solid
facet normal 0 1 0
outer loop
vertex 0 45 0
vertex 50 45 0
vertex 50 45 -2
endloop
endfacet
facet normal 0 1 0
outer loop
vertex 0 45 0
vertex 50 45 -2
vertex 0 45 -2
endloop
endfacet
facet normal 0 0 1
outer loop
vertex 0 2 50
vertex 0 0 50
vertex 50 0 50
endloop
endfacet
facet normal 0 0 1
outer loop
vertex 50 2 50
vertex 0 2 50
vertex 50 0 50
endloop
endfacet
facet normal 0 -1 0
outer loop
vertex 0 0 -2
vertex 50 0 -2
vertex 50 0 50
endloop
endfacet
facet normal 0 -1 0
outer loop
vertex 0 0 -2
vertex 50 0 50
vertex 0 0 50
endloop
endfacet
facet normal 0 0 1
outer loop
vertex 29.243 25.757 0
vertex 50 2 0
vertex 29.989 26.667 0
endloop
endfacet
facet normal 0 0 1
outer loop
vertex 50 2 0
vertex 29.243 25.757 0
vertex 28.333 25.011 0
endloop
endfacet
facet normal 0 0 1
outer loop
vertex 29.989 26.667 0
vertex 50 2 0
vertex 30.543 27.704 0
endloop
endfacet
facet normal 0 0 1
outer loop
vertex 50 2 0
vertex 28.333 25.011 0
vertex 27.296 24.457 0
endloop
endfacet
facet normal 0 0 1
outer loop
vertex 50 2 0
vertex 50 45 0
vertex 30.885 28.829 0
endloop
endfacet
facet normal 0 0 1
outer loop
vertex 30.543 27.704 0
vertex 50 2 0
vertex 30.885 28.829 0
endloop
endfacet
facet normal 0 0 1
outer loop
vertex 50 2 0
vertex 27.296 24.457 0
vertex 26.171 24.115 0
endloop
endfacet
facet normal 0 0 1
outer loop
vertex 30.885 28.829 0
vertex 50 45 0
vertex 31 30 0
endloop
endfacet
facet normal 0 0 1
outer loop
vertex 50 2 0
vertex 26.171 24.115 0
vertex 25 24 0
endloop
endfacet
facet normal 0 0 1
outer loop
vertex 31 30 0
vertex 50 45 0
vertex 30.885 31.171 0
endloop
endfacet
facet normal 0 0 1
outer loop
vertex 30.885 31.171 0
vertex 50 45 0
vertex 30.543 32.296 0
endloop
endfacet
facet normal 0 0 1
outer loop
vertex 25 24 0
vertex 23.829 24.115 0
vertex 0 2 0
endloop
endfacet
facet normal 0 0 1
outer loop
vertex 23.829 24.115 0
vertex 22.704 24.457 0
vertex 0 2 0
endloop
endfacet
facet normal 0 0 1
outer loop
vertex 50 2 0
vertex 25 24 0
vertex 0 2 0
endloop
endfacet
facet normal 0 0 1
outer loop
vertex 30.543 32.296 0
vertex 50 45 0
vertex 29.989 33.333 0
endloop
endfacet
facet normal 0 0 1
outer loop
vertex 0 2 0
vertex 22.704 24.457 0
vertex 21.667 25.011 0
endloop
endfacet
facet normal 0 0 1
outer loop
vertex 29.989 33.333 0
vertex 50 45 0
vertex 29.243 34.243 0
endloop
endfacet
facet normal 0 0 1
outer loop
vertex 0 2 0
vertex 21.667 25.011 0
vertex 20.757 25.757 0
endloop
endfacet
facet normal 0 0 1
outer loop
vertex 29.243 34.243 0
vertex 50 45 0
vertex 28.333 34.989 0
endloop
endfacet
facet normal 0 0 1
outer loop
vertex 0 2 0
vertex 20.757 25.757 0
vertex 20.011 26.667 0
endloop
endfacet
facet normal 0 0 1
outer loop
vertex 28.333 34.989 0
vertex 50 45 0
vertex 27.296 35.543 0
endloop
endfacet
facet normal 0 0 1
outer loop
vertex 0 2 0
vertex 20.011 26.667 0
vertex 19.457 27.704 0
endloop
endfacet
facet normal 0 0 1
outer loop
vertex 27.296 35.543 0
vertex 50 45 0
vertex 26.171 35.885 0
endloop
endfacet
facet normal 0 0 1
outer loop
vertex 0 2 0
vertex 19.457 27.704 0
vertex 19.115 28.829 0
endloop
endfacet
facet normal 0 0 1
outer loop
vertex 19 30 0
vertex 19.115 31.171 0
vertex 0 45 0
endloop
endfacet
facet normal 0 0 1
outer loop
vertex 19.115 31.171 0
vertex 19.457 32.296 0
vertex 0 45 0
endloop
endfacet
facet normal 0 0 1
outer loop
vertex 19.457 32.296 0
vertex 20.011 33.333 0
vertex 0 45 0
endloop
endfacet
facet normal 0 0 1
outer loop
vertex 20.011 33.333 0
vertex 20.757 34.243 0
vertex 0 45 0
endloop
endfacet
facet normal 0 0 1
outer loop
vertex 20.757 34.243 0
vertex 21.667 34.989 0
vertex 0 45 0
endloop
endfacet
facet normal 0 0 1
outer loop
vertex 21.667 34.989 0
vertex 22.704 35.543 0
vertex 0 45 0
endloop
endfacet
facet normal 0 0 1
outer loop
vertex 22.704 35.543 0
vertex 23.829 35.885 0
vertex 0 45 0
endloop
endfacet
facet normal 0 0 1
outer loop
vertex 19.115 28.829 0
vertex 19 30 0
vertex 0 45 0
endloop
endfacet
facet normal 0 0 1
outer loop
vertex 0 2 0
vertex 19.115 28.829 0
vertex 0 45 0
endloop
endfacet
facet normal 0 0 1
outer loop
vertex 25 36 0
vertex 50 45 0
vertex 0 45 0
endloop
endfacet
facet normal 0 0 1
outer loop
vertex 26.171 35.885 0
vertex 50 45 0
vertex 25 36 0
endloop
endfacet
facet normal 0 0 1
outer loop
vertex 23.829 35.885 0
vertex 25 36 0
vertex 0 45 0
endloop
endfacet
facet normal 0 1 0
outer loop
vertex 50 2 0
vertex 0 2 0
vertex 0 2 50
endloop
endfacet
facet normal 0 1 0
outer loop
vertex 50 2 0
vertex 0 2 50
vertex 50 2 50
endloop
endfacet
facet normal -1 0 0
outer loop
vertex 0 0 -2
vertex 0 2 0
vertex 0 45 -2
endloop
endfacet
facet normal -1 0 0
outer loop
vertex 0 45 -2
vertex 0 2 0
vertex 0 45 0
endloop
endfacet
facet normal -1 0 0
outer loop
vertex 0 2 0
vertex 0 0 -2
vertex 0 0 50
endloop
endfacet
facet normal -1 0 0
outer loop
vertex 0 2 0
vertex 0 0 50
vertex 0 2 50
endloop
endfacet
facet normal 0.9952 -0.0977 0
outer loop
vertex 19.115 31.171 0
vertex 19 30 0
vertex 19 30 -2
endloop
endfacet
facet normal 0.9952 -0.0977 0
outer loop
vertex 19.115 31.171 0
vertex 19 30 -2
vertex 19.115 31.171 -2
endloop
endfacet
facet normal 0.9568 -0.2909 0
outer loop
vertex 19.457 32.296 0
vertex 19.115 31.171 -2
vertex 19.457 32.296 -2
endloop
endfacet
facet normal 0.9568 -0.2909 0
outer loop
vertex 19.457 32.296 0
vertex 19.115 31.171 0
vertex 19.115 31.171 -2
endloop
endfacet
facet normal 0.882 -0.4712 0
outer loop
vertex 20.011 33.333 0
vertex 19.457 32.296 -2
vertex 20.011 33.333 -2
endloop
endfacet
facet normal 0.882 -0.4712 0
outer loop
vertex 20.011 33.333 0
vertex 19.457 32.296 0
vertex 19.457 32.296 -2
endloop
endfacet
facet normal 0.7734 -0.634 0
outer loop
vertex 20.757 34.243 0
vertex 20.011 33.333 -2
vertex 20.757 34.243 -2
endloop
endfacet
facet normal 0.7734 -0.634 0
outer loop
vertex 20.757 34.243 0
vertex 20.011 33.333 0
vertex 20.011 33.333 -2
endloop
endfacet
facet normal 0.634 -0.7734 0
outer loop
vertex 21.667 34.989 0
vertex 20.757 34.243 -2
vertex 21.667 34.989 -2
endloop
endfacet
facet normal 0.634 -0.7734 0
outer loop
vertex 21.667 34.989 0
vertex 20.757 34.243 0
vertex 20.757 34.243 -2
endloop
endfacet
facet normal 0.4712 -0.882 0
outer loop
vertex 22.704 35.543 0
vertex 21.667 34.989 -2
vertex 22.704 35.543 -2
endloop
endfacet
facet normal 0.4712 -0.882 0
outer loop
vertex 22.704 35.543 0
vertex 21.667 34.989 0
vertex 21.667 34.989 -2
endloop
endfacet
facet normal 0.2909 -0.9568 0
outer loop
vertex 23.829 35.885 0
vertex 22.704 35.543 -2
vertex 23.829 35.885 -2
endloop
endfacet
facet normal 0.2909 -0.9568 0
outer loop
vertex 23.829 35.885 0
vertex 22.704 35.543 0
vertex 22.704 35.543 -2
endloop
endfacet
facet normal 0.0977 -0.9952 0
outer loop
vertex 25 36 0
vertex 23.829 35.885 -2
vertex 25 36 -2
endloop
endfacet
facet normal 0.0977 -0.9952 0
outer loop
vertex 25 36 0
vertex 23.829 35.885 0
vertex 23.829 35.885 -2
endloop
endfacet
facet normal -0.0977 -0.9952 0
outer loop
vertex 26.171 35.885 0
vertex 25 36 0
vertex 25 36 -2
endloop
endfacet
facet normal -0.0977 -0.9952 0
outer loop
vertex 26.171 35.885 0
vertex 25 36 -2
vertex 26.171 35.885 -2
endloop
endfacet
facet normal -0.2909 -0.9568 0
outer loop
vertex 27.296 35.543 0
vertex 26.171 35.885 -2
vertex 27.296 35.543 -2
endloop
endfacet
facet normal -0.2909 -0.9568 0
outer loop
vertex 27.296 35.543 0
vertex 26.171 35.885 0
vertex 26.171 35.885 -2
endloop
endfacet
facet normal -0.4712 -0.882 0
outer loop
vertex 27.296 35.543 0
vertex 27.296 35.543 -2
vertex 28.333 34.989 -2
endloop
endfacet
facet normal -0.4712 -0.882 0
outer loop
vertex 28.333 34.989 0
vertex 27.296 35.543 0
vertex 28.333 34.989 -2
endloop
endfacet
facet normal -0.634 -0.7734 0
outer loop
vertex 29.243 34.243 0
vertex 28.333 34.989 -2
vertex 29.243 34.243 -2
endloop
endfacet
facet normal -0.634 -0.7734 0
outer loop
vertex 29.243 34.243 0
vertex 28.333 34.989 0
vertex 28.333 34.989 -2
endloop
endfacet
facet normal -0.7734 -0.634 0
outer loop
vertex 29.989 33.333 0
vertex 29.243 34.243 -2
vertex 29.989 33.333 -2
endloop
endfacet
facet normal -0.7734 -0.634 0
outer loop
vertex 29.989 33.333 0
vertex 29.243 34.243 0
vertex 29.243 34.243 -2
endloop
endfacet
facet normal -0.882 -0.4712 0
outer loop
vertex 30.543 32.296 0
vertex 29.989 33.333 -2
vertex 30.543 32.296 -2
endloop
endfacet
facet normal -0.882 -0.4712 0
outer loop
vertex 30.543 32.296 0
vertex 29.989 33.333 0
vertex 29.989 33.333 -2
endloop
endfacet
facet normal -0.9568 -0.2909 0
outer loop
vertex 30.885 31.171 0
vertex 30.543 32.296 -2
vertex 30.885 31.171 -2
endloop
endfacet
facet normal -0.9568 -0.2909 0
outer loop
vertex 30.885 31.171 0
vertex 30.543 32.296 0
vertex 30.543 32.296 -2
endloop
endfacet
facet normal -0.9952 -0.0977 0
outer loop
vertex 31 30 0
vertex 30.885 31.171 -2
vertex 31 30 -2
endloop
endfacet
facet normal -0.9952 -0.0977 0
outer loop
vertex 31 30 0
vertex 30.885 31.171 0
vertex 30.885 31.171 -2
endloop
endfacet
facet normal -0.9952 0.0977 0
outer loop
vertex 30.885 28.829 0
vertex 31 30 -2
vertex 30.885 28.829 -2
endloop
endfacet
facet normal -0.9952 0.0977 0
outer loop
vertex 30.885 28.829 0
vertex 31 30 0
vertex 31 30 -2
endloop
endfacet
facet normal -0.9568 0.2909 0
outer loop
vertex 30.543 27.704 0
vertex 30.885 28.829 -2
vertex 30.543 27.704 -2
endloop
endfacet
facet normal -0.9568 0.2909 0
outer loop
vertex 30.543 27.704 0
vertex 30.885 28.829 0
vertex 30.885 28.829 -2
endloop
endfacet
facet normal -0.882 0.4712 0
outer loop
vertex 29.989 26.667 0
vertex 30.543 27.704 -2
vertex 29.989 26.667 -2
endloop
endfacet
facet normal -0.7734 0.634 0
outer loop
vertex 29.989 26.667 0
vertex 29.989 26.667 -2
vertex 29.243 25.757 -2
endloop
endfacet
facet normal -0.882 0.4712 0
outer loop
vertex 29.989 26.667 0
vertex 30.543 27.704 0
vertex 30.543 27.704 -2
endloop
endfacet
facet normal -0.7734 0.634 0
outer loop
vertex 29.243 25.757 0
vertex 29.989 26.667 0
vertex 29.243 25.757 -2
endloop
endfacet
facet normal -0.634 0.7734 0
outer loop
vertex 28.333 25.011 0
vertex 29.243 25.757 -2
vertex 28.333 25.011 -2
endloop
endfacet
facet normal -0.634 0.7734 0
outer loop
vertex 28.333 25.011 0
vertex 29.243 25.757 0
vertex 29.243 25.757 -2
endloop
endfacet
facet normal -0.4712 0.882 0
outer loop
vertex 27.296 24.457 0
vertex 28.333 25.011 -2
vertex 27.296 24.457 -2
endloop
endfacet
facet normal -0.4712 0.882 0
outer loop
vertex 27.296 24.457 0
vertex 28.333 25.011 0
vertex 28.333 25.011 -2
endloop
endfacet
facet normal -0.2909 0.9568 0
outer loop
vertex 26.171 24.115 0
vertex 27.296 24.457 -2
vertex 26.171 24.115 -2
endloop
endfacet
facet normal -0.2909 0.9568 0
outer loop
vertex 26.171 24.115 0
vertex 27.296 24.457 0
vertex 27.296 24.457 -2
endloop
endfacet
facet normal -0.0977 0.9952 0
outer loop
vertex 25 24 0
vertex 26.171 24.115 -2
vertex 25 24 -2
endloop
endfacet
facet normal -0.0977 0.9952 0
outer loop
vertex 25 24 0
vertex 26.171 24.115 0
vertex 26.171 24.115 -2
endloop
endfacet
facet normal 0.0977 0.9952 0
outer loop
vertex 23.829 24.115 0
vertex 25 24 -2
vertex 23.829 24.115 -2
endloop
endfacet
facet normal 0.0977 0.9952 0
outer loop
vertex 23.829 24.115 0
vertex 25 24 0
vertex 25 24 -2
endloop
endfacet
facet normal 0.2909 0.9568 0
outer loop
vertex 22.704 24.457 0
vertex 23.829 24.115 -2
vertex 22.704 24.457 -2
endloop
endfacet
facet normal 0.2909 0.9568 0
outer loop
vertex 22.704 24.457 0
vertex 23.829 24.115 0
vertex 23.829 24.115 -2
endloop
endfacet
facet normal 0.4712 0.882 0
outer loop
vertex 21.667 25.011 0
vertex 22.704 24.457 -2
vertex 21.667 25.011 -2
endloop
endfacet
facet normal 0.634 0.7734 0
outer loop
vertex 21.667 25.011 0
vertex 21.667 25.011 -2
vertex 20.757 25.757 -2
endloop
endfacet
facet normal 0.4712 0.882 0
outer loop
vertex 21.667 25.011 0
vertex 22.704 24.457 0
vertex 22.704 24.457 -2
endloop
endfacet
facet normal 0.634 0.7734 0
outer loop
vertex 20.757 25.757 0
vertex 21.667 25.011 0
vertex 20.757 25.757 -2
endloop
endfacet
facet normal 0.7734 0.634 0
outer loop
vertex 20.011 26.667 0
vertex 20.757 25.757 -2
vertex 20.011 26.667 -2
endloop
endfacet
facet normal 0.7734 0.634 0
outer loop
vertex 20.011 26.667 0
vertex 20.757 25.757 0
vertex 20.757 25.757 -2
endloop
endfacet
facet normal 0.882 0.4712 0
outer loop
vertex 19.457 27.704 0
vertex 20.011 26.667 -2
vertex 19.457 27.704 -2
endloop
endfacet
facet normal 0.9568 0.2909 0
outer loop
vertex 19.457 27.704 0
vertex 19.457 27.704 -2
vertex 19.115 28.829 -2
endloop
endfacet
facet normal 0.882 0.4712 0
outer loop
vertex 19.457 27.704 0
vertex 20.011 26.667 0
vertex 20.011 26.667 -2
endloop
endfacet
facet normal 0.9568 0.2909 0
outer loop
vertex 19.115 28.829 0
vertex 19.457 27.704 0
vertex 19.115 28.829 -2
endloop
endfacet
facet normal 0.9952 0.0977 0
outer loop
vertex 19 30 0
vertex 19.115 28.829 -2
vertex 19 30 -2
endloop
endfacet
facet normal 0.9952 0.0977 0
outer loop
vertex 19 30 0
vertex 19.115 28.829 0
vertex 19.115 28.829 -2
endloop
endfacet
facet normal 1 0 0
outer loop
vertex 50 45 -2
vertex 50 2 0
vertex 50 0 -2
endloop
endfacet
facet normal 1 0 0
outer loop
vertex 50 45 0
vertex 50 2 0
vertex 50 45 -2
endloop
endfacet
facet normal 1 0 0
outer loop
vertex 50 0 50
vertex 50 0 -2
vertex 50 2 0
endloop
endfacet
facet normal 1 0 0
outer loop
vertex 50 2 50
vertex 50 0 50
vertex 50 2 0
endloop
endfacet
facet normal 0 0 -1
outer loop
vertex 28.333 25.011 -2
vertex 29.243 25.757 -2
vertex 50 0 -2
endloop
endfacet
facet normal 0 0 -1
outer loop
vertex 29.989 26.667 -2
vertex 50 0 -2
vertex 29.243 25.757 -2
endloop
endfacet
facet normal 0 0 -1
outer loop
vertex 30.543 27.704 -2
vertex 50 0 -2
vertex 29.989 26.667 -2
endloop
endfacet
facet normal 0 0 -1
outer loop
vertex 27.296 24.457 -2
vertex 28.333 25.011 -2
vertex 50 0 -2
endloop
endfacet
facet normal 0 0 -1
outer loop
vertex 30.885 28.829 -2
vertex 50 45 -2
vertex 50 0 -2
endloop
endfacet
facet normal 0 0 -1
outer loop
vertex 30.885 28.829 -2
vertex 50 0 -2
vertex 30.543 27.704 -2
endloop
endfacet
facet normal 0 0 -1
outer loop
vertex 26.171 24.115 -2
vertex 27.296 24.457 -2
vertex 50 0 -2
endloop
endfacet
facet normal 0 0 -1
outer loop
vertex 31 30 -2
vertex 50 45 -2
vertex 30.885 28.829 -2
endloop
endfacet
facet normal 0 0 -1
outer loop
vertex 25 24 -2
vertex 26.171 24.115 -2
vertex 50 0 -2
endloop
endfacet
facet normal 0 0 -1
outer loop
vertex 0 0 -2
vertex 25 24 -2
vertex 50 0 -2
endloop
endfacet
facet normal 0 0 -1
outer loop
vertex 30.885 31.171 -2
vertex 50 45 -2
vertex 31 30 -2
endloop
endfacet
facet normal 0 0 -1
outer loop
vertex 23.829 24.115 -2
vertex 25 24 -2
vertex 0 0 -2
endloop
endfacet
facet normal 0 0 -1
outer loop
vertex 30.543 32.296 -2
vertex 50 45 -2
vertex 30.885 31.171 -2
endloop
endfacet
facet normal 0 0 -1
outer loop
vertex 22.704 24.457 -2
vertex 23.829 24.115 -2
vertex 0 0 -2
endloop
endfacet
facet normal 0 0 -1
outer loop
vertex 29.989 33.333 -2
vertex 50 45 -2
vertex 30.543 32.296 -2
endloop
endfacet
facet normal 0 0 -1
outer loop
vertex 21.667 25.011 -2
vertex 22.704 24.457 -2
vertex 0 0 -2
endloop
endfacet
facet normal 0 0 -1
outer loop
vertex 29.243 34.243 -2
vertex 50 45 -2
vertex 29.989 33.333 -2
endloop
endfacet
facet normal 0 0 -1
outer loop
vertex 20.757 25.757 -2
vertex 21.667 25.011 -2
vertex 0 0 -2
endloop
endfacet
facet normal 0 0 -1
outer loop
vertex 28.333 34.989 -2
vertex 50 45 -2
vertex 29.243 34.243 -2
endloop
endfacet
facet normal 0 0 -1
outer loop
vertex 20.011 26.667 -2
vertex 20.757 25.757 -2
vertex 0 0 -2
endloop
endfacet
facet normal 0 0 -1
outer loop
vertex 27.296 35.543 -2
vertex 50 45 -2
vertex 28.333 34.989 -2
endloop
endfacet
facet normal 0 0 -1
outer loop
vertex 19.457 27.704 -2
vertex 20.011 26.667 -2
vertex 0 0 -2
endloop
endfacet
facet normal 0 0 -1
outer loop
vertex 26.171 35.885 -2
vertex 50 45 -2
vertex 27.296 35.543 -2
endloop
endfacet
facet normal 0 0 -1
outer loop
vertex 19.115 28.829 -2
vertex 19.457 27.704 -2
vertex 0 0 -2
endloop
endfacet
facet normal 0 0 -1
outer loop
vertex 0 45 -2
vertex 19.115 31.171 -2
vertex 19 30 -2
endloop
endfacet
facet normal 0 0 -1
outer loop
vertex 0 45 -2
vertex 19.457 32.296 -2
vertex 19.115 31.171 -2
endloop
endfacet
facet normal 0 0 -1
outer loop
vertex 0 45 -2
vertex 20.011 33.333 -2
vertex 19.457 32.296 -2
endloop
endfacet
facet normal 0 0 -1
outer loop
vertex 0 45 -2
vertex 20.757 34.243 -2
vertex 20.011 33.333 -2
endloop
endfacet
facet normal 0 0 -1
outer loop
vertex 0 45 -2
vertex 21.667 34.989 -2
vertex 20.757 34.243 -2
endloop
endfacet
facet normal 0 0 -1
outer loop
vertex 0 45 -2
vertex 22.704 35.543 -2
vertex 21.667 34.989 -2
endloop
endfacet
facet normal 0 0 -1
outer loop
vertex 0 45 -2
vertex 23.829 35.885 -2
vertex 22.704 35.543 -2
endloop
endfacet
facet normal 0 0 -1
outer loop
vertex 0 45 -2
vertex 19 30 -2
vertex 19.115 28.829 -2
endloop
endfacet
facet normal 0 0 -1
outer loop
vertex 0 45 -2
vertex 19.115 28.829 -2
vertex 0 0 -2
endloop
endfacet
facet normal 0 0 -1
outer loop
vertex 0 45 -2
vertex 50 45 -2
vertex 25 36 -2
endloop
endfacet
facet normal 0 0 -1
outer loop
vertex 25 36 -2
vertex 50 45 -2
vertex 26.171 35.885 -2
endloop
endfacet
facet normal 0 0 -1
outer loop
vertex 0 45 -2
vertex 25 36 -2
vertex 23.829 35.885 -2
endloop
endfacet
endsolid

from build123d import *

# Parameters (mm, degrees)
SKETCH1_W           = 50
SKETCH1_H           = 50
BOSS_EXTRUDE1_DEPTH = 2
SKETCH2_W           = 50
SKETCH2_H           = 45
SKETCH2_R           = 6
BOSS_EXTRUDE2_DEPTH = 2


with BuildPart() as part:
    # Sketch1 → Boss-Extrude1 (new body)
    with BuildSketch(Plane(origin=(0, 0, 0), x_dir=(1, 0, 0), z_dir=(0, 1, 0))):
        with Locations((25, -25)):
            Rectangle(SKETCH1_W, SKETCH1_H)
    extrude(amount=BOSS_EXTRUDE1_DEPTH)

    # Sketch2 → Boss-Extrude2 (add)
    with BuildSketch(Plane(origin=(0, 0, 0), x_dir=(-1, 0, 0), z_dir=(0, 0, -1))):
        with Locations((-25, 22.5)):
            Rectangle(SKETCH2_W, SKETCH2_H)
        with Locations((-25, 30)):
            Circle(SKETCH2_R, mode=Mode.SUBTRACT)
    extrude(amount=BOSS_EXTRUDE2_DEPTH)


solid = part.part
